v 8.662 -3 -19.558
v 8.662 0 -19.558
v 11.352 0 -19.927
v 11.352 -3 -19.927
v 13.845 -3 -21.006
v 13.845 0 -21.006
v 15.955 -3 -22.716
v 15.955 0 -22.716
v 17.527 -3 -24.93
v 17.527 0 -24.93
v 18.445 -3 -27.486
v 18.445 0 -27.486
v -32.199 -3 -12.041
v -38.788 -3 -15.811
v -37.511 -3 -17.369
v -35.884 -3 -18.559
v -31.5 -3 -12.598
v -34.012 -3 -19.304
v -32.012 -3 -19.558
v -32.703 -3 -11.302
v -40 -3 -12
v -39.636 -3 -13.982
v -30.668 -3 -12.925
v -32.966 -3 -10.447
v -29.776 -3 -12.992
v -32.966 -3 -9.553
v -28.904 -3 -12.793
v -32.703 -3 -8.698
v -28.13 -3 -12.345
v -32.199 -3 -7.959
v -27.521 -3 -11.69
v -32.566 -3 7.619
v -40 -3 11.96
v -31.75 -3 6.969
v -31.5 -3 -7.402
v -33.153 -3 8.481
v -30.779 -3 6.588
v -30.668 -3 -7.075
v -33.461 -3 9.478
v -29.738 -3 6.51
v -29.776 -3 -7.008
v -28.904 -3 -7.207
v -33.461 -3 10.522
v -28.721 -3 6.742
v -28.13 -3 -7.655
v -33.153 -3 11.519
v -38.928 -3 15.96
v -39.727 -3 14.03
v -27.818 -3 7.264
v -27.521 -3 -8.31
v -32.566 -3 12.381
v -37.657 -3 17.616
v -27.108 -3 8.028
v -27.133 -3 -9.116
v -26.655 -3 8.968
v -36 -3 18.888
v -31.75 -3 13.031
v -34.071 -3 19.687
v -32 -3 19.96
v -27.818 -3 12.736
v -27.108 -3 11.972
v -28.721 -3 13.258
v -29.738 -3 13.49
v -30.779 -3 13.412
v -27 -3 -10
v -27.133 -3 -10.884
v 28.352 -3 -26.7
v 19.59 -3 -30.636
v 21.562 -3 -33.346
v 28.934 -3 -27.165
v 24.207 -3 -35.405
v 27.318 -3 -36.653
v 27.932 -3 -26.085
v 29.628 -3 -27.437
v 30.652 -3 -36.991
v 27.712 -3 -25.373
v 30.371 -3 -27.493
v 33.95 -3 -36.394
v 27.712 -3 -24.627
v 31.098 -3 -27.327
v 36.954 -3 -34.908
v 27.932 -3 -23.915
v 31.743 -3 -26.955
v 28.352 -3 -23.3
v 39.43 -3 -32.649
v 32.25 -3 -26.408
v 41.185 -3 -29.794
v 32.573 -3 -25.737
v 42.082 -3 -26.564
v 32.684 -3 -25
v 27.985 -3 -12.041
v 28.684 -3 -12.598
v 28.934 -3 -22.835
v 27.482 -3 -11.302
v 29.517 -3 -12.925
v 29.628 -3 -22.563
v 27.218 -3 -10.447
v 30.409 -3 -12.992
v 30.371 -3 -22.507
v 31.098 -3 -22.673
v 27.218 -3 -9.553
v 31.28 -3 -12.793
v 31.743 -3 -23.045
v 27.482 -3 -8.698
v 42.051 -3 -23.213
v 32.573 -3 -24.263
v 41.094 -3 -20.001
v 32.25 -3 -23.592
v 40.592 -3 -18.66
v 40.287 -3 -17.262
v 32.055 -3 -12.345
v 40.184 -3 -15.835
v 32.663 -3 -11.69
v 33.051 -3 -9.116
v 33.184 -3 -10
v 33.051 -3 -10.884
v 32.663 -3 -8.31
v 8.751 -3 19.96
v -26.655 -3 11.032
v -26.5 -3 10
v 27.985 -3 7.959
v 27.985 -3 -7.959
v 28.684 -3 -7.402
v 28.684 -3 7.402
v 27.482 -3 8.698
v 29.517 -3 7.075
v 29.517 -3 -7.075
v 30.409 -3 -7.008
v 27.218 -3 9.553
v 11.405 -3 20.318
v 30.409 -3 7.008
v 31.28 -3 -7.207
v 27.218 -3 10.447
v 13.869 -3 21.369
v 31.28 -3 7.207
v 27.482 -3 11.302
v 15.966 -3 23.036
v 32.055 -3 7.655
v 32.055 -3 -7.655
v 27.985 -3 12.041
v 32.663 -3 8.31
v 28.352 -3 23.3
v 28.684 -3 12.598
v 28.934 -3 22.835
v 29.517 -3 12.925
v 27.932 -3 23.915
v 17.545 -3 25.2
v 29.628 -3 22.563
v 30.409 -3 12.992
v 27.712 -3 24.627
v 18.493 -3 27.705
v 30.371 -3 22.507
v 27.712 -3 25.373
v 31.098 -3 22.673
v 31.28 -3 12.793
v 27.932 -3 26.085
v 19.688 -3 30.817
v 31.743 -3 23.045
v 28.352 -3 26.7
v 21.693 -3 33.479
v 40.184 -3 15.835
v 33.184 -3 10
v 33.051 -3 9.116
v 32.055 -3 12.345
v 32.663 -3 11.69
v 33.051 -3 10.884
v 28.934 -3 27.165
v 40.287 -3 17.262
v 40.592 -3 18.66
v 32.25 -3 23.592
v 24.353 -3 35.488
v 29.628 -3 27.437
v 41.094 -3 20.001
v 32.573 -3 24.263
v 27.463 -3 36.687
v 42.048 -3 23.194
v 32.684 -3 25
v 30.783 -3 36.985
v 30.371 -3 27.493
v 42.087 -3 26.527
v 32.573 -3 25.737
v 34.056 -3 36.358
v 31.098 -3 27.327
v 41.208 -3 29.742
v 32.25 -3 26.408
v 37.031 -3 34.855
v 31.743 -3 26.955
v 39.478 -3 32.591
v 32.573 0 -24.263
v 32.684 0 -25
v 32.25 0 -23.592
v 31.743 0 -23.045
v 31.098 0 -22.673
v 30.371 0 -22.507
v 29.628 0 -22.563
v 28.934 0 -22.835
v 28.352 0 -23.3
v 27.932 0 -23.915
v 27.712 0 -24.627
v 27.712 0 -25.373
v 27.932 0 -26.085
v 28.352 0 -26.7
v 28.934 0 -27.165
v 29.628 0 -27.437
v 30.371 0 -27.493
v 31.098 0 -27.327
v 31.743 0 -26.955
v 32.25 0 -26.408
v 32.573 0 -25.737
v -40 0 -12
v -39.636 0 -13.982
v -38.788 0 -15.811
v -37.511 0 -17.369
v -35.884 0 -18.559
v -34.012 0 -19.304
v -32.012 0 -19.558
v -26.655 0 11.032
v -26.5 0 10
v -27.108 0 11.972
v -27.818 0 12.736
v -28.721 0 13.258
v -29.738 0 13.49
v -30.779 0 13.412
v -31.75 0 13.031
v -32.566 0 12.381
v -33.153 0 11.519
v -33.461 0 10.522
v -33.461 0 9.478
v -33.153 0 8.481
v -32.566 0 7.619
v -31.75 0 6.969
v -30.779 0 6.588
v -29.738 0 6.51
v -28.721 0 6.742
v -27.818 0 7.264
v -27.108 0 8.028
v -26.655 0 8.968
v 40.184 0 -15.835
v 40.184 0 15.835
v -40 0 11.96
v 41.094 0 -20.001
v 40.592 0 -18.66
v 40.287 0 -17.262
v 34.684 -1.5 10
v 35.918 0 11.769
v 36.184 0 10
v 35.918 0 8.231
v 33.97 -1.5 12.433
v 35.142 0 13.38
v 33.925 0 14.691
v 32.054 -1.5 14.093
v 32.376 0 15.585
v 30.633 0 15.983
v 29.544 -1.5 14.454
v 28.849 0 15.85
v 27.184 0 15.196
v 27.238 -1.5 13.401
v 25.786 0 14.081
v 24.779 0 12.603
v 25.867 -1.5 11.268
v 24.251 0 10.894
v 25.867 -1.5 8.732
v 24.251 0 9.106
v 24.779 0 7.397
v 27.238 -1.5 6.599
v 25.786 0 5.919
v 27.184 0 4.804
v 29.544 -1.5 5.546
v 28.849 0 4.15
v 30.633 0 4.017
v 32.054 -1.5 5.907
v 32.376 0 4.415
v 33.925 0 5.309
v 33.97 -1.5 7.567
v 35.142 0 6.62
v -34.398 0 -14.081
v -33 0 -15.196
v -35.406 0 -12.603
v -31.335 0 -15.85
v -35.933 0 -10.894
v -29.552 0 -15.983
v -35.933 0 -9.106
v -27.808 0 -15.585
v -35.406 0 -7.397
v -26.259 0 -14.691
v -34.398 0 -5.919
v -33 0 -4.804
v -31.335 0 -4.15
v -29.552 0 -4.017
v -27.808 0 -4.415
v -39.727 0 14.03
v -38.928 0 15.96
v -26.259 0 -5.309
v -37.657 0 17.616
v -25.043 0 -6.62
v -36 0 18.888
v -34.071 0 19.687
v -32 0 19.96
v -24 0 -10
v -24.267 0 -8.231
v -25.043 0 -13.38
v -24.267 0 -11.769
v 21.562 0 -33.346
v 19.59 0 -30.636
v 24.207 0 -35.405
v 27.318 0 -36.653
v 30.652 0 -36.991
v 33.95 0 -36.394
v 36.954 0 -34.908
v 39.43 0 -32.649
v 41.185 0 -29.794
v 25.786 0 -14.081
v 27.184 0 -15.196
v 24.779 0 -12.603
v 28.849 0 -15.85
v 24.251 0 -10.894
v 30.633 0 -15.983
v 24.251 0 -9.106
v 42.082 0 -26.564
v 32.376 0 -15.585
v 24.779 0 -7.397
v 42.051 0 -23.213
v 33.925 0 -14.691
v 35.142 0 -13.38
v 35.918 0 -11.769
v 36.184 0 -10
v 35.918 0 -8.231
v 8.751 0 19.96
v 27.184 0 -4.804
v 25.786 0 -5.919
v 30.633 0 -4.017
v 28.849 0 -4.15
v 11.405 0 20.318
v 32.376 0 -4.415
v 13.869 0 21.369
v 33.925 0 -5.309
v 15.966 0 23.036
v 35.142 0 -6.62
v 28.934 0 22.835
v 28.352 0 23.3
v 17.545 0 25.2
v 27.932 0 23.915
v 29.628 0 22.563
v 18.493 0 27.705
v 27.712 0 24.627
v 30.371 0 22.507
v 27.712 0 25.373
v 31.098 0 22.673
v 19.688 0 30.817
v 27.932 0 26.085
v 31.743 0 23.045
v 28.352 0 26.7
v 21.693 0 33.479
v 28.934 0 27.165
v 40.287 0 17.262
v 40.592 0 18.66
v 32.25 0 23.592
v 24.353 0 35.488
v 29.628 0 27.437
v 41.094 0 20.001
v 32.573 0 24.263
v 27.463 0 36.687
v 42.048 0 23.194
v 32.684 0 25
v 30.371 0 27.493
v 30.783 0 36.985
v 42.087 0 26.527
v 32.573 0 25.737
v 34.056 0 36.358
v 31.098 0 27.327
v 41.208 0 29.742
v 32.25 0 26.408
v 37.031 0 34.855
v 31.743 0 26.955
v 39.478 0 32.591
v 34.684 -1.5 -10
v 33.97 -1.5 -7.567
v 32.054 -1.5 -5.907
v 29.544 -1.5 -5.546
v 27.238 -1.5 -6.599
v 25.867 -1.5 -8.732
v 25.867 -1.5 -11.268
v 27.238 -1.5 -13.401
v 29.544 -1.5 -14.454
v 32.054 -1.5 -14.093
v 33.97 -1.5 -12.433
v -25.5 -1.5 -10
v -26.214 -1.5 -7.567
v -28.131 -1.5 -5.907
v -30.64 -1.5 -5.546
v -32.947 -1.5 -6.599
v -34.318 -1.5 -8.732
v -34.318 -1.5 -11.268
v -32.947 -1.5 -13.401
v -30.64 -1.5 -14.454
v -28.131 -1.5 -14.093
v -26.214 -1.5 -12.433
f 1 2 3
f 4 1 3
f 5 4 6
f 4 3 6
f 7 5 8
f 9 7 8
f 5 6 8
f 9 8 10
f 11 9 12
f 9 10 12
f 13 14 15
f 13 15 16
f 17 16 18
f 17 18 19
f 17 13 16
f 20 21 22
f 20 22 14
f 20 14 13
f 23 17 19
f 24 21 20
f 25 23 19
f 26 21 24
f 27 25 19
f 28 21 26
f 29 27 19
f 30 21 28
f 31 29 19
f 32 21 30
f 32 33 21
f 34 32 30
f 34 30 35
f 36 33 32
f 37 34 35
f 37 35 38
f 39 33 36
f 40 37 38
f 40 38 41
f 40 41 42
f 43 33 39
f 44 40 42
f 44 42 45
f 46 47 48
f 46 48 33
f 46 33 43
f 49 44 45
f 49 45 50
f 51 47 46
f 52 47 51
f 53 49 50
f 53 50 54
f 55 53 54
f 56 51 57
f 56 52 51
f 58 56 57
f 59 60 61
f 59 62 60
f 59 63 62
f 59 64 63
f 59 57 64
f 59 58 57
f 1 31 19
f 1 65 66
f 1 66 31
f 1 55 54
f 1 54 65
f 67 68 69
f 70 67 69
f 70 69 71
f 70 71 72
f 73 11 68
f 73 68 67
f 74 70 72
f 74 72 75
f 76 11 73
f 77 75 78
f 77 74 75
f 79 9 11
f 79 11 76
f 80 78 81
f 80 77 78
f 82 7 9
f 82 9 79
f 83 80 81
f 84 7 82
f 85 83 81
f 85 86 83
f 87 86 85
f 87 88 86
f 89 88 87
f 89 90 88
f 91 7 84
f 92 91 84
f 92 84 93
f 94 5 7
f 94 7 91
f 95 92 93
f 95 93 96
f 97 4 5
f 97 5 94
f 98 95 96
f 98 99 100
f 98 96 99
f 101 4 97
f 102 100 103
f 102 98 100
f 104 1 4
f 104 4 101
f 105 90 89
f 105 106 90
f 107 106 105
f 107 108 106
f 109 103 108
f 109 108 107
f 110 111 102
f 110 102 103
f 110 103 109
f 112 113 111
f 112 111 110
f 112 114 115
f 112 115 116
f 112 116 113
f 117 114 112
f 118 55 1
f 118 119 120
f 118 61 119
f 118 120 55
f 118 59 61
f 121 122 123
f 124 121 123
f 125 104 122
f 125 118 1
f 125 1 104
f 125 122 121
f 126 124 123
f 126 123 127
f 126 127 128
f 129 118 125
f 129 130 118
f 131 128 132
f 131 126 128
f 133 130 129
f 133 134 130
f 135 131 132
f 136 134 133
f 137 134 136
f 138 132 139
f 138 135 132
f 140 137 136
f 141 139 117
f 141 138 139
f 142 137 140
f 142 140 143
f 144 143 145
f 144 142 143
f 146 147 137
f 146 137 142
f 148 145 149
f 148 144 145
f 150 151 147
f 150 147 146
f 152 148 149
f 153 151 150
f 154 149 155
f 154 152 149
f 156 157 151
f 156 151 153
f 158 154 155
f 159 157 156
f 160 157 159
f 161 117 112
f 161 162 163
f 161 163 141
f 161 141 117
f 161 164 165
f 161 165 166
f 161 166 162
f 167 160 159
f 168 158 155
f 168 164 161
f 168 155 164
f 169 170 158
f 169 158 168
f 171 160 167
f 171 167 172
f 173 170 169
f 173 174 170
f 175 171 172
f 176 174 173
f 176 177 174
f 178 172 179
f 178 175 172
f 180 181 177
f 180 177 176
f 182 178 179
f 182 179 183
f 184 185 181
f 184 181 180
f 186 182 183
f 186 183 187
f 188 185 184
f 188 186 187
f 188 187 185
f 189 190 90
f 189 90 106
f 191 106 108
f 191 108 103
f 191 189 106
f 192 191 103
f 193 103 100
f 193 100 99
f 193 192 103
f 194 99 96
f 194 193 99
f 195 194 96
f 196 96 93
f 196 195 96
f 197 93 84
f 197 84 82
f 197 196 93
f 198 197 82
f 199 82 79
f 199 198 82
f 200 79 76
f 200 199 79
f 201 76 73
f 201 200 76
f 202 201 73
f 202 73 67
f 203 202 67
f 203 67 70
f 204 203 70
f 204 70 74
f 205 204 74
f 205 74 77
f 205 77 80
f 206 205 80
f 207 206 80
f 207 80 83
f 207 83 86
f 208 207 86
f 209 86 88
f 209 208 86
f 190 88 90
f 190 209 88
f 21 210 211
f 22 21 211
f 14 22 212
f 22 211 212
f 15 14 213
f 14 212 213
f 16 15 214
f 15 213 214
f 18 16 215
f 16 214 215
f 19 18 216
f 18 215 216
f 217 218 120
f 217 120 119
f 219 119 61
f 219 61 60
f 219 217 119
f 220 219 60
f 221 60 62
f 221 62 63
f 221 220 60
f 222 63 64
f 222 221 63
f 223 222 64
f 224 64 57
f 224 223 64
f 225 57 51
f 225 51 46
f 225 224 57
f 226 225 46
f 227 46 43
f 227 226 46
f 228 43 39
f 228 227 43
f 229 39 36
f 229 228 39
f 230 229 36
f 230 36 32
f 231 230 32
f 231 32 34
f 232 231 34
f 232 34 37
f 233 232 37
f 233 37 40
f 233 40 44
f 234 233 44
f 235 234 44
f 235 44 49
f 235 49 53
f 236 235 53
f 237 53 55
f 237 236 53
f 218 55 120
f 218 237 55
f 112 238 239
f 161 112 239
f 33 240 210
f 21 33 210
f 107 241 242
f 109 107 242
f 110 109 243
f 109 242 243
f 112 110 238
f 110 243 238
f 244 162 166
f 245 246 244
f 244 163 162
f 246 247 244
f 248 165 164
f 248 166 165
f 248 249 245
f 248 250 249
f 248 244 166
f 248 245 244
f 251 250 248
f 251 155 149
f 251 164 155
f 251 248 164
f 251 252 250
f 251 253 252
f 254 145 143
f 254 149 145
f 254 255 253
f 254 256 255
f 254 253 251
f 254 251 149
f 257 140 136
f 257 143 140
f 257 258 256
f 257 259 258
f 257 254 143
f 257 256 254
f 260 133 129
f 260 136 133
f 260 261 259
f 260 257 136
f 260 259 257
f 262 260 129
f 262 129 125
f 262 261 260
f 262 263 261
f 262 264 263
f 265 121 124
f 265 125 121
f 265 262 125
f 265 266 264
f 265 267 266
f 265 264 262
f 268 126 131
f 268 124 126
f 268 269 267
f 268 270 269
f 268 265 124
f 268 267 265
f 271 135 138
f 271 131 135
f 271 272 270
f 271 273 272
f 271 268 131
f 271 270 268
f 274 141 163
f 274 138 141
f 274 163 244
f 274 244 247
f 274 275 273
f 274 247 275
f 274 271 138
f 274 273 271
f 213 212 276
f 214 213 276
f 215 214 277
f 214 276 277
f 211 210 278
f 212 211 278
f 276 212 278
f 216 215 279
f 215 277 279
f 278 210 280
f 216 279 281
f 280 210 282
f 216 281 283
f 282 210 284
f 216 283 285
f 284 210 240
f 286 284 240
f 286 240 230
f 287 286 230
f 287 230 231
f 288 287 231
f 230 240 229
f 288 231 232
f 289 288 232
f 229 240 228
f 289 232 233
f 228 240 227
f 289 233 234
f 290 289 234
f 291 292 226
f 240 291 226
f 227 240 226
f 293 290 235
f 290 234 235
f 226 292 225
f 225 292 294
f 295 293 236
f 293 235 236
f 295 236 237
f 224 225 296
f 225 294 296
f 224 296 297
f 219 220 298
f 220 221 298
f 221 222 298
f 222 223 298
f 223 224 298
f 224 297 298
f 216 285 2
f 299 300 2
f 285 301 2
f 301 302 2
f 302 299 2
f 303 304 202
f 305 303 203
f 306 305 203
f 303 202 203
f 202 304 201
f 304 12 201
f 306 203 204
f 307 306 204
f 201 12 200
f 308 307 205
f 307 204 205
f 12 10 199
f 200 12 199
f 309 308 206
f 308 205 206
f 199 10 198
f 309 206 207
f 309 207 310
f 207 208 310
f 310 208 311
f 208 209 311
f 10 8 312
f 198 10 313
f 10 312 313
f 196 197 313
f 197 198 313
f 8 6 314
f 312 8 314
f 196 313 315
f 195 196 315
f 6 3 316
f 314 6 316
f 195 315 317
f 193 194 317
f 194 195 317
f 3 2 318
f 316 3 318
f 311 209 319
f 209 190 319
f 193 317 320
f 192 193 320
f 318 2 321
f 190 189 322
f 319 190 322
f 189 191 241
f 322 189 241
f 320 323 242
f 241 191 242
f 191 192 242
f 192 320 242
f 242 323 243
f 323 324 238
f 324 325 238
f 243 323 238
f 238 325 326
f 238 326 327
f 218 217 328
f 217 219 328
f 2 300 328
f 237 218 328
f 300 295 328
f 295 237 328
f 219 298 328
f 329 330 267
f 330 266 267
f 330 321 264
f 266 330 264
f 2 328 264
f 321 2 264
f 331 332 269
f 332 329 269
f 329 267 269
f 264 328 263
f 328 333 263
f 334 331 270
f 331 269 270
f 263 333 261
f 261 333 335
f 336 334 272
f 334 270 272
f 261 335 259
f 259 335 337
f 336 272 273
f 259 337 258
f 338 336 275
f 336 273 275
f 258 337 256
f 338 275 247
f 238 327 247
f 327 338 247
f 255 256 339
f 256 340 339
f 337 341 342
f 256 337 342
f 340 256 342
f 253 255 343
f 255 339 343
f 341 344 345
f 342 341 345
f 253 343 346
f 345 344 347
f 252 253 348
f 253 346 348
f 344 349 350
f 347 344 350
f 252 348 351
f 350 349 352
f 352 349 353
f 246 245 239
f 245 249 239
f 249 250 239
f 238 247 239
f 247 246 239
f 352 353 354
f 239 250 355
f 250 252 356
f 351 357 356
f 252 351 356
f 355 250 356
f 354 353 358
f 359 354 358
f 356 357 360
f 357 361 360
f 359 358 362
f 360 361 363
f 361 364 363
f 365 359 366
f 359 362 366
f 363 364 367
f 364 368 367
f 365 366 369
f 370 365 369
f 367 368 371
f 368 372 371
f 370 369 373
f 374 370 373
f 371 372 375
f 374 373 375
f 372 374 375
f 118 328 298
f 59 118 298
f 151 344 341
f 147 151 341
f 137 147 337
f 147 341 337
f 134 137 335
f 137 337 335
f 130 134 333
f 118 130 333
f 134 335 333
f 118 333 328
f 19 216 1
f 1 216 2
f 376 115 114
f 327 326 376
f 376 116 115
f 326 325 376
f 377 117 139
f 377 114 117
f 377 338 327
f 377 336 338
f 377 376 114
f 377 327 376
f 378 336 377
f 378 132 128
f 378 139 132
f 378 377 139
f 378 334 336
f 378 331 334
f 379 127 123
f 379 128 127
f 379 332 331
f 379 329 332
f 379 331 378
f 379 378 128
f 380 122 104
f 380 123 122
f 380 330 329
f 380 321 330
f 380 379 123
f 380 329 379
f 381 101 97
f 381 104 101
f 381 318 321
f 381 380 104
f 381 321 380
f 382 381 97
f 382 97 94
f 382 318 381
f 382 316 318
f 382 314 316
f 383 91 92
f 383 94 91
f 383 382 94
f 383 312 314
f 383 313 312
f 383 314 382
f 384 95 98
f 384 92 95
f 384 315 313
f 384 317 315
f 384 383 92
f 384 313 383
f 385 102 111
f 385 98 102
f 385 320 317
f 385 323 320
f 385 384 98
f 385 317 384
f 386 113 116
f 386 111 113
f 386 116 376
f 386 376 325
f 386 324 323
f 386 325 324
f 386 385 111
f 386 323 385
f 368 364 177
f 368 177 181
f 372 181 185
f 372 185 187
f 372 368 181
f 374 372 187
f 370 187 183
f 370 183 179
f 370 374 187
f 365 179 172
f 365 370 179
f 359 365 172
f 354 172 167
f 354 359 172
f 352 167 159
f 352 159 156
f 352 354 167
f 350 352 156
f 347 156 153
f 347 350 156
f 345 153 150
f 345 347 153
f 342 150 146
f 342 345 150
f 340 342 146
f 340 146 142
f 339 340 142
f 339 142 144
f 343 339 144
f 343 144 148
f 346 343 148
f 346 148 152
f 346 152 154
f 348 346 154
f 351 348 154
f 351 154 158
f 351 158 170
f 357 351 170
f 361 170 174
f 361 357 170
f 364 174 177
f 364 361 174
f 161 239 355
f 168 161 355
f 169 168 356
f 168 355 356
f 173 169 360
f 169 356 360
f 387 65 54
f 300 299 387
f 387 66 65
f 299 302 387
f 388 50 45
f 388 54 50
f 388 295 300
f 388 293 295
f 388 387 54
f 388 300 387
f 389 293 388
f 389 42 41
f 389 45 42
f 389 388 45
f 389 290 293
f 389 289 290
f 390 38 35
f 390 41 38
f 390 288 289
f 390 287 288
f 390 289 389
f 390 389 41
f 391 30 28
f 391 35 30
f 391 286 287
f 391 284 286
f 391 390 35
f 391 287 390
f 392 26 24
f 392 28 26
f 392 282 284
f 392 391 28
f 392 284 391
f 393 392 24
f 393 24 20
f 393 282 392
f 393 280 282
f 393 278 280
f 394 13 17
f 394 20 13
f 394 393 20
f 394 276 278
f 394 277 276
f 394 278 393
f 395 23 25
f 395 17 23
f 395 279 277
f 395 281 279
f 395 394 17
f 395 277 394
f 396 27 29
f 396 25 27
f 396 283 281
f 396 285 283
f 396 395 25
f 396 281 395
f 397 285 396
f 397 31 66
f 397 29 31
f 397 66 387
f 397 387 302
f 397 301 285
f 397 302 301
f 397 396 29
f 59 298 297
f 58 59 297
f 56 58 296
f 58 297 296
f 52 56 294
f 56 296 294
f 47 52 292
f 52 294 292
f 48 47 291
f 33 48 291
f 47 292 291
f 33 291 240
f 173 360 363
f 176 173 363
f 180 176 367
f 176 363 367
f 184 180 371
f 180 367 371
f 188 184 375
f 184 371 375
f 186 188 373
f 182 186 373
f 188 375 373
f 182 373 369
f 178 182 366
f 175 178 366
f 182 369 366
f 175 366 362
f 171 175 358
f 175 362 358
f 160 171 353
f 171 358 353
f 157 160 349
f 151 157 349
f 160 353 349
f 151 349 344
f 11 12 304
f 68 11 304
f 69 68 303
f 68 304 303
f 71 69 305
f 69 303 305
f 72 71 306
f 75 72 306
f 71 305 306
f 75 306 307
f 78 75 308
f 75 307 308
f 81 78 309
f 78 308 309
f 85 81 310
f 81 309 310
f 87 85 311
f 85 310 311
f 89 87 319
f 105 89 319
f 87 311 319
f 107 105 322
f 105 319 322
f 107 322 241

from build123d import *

# Parameters (mm, degrees)
F0_R     = 2.5
F0_R_2   = 3.5
F1_DEPTH = 3


# Not quite as in the source:
# - a fillet or chamfer that OpenCascade refuses, or shapes differently, is made with other operations: its cross-section is extruded or revolved along the edge and cut away or added


with BuildPart() as f1:
    # F0 (on Front) → F1 (new body)
    with BuildSketch(Plane.XZ):
        with BuildLine():
            ThreePointArc((8.6618165432, -19.5581924259), (14.9578845034, -21.7890529471), (18.4448225733, -27.4862867778))
            ThreePointArc((18.4448225733, -27.4862867778), (33.9501260505, -36.3938374492), (41.0935207185, -20.0008265146))
            ThreePointArc((41.0935207185, -20.0008265146), (40.4143456003, -17.9668557736), (40.1844298095, -15.8348486101))
            Line((40.1844298095, -15.8348486101), (40.1844298095, 15.8348486101))
            ThreePointArc((40.1844298095, 15.8348486101), (40.4143456003, 17.9668557736), (41.0935207185, 20.0008265146))
            ThreePointArc((41.0935207185, 20.0008265146), (34.0564016131, 36.3581615745), (18.4933227899, 27.7051832948))
            ThreePointArc((18.4933227899, 27.7051832948), (14.9739484465, 22.1318851219), (8.750733607, 19.9595027072))
            Line((8.750733607, 19.9595027072), (-32, 19.9595027072))
            ThreePointArc((-32, 19.9595027072), (-37.6568542495, 17.6163569566), (-40, 11.9595027072))
            Line((-40, 11.9595027072), (-40, -12))
            ThreePointArc((-40, -12), (-37.5106423232, -17.3691502038), (-32.0122089369, -19.5581924259))
            Line((-32.0122089369, -19.5581924259), (8.6618165432, -19.5581924259))
        make_face()
        with Locations((-30, -10)):
            Circle(F0_R, mode=Mode.SUBTRACT)
        with Locations((30.1844298095, -25)):
            Circle(F0_R, mode=Mode.SUBTRACT)
        with Locations((30.1844298095, -10)):
            Circle(F0_R, mode=Mode.SUBTRACT)
        with Locations((-30, 10)):
            Circle(F0_R_2, mode=Mode.SUBTRACT)
        with Locations((30.1844298095, 10)):
            Circle(F0_R, mode=Mode.SUBTRACT)
        with Locations((30.1844298095, 25)):
            Circle(F0_R, mode=Mode.SUBTRACT)
    extrude(amount=F1_DEPTH)

    # F2: chamfer of 3.5 on 3 edges, made by hand

    # F2_s1 → F2_t2 (revolve, cut)
    with BuildSketch(Plane.XY.offset(10)):
        Polygon((32.6844298095, -3.5), (36.1844298095, 0), (32.6844298095, 0), align=None)
    revolve(axis=Axis((30.1844298095, 0, 10), (0, -1, 0)), mode=Mode.SUBTRACT)

    # F2_s3 → F2_t4 (revolve, cut)
    with BuildSketch(Plane.XY.offset(-10)):
        Polygon((32.6844298095, -3.5), (36.1844298095, 0), (32.6844298095, 0), align=None)
    revolve(axis=Axis((30.1844298095, 0, -10), (0, -1, 0)), mode=Mode.SUBTRACT)

    # F2_s5 → F2_t6 (revolve, cut)
    with BuildSketch(Plane.XY.offset(-10)):
        Polygon((-27.5, -3.5), (-24, 0), (-27.5, 0), align=None)
    revolve(axis=Axis((-30, 0, -10), (0, -1, 0)), mode=Mode.SUBTRACT)


solid = f1.part
